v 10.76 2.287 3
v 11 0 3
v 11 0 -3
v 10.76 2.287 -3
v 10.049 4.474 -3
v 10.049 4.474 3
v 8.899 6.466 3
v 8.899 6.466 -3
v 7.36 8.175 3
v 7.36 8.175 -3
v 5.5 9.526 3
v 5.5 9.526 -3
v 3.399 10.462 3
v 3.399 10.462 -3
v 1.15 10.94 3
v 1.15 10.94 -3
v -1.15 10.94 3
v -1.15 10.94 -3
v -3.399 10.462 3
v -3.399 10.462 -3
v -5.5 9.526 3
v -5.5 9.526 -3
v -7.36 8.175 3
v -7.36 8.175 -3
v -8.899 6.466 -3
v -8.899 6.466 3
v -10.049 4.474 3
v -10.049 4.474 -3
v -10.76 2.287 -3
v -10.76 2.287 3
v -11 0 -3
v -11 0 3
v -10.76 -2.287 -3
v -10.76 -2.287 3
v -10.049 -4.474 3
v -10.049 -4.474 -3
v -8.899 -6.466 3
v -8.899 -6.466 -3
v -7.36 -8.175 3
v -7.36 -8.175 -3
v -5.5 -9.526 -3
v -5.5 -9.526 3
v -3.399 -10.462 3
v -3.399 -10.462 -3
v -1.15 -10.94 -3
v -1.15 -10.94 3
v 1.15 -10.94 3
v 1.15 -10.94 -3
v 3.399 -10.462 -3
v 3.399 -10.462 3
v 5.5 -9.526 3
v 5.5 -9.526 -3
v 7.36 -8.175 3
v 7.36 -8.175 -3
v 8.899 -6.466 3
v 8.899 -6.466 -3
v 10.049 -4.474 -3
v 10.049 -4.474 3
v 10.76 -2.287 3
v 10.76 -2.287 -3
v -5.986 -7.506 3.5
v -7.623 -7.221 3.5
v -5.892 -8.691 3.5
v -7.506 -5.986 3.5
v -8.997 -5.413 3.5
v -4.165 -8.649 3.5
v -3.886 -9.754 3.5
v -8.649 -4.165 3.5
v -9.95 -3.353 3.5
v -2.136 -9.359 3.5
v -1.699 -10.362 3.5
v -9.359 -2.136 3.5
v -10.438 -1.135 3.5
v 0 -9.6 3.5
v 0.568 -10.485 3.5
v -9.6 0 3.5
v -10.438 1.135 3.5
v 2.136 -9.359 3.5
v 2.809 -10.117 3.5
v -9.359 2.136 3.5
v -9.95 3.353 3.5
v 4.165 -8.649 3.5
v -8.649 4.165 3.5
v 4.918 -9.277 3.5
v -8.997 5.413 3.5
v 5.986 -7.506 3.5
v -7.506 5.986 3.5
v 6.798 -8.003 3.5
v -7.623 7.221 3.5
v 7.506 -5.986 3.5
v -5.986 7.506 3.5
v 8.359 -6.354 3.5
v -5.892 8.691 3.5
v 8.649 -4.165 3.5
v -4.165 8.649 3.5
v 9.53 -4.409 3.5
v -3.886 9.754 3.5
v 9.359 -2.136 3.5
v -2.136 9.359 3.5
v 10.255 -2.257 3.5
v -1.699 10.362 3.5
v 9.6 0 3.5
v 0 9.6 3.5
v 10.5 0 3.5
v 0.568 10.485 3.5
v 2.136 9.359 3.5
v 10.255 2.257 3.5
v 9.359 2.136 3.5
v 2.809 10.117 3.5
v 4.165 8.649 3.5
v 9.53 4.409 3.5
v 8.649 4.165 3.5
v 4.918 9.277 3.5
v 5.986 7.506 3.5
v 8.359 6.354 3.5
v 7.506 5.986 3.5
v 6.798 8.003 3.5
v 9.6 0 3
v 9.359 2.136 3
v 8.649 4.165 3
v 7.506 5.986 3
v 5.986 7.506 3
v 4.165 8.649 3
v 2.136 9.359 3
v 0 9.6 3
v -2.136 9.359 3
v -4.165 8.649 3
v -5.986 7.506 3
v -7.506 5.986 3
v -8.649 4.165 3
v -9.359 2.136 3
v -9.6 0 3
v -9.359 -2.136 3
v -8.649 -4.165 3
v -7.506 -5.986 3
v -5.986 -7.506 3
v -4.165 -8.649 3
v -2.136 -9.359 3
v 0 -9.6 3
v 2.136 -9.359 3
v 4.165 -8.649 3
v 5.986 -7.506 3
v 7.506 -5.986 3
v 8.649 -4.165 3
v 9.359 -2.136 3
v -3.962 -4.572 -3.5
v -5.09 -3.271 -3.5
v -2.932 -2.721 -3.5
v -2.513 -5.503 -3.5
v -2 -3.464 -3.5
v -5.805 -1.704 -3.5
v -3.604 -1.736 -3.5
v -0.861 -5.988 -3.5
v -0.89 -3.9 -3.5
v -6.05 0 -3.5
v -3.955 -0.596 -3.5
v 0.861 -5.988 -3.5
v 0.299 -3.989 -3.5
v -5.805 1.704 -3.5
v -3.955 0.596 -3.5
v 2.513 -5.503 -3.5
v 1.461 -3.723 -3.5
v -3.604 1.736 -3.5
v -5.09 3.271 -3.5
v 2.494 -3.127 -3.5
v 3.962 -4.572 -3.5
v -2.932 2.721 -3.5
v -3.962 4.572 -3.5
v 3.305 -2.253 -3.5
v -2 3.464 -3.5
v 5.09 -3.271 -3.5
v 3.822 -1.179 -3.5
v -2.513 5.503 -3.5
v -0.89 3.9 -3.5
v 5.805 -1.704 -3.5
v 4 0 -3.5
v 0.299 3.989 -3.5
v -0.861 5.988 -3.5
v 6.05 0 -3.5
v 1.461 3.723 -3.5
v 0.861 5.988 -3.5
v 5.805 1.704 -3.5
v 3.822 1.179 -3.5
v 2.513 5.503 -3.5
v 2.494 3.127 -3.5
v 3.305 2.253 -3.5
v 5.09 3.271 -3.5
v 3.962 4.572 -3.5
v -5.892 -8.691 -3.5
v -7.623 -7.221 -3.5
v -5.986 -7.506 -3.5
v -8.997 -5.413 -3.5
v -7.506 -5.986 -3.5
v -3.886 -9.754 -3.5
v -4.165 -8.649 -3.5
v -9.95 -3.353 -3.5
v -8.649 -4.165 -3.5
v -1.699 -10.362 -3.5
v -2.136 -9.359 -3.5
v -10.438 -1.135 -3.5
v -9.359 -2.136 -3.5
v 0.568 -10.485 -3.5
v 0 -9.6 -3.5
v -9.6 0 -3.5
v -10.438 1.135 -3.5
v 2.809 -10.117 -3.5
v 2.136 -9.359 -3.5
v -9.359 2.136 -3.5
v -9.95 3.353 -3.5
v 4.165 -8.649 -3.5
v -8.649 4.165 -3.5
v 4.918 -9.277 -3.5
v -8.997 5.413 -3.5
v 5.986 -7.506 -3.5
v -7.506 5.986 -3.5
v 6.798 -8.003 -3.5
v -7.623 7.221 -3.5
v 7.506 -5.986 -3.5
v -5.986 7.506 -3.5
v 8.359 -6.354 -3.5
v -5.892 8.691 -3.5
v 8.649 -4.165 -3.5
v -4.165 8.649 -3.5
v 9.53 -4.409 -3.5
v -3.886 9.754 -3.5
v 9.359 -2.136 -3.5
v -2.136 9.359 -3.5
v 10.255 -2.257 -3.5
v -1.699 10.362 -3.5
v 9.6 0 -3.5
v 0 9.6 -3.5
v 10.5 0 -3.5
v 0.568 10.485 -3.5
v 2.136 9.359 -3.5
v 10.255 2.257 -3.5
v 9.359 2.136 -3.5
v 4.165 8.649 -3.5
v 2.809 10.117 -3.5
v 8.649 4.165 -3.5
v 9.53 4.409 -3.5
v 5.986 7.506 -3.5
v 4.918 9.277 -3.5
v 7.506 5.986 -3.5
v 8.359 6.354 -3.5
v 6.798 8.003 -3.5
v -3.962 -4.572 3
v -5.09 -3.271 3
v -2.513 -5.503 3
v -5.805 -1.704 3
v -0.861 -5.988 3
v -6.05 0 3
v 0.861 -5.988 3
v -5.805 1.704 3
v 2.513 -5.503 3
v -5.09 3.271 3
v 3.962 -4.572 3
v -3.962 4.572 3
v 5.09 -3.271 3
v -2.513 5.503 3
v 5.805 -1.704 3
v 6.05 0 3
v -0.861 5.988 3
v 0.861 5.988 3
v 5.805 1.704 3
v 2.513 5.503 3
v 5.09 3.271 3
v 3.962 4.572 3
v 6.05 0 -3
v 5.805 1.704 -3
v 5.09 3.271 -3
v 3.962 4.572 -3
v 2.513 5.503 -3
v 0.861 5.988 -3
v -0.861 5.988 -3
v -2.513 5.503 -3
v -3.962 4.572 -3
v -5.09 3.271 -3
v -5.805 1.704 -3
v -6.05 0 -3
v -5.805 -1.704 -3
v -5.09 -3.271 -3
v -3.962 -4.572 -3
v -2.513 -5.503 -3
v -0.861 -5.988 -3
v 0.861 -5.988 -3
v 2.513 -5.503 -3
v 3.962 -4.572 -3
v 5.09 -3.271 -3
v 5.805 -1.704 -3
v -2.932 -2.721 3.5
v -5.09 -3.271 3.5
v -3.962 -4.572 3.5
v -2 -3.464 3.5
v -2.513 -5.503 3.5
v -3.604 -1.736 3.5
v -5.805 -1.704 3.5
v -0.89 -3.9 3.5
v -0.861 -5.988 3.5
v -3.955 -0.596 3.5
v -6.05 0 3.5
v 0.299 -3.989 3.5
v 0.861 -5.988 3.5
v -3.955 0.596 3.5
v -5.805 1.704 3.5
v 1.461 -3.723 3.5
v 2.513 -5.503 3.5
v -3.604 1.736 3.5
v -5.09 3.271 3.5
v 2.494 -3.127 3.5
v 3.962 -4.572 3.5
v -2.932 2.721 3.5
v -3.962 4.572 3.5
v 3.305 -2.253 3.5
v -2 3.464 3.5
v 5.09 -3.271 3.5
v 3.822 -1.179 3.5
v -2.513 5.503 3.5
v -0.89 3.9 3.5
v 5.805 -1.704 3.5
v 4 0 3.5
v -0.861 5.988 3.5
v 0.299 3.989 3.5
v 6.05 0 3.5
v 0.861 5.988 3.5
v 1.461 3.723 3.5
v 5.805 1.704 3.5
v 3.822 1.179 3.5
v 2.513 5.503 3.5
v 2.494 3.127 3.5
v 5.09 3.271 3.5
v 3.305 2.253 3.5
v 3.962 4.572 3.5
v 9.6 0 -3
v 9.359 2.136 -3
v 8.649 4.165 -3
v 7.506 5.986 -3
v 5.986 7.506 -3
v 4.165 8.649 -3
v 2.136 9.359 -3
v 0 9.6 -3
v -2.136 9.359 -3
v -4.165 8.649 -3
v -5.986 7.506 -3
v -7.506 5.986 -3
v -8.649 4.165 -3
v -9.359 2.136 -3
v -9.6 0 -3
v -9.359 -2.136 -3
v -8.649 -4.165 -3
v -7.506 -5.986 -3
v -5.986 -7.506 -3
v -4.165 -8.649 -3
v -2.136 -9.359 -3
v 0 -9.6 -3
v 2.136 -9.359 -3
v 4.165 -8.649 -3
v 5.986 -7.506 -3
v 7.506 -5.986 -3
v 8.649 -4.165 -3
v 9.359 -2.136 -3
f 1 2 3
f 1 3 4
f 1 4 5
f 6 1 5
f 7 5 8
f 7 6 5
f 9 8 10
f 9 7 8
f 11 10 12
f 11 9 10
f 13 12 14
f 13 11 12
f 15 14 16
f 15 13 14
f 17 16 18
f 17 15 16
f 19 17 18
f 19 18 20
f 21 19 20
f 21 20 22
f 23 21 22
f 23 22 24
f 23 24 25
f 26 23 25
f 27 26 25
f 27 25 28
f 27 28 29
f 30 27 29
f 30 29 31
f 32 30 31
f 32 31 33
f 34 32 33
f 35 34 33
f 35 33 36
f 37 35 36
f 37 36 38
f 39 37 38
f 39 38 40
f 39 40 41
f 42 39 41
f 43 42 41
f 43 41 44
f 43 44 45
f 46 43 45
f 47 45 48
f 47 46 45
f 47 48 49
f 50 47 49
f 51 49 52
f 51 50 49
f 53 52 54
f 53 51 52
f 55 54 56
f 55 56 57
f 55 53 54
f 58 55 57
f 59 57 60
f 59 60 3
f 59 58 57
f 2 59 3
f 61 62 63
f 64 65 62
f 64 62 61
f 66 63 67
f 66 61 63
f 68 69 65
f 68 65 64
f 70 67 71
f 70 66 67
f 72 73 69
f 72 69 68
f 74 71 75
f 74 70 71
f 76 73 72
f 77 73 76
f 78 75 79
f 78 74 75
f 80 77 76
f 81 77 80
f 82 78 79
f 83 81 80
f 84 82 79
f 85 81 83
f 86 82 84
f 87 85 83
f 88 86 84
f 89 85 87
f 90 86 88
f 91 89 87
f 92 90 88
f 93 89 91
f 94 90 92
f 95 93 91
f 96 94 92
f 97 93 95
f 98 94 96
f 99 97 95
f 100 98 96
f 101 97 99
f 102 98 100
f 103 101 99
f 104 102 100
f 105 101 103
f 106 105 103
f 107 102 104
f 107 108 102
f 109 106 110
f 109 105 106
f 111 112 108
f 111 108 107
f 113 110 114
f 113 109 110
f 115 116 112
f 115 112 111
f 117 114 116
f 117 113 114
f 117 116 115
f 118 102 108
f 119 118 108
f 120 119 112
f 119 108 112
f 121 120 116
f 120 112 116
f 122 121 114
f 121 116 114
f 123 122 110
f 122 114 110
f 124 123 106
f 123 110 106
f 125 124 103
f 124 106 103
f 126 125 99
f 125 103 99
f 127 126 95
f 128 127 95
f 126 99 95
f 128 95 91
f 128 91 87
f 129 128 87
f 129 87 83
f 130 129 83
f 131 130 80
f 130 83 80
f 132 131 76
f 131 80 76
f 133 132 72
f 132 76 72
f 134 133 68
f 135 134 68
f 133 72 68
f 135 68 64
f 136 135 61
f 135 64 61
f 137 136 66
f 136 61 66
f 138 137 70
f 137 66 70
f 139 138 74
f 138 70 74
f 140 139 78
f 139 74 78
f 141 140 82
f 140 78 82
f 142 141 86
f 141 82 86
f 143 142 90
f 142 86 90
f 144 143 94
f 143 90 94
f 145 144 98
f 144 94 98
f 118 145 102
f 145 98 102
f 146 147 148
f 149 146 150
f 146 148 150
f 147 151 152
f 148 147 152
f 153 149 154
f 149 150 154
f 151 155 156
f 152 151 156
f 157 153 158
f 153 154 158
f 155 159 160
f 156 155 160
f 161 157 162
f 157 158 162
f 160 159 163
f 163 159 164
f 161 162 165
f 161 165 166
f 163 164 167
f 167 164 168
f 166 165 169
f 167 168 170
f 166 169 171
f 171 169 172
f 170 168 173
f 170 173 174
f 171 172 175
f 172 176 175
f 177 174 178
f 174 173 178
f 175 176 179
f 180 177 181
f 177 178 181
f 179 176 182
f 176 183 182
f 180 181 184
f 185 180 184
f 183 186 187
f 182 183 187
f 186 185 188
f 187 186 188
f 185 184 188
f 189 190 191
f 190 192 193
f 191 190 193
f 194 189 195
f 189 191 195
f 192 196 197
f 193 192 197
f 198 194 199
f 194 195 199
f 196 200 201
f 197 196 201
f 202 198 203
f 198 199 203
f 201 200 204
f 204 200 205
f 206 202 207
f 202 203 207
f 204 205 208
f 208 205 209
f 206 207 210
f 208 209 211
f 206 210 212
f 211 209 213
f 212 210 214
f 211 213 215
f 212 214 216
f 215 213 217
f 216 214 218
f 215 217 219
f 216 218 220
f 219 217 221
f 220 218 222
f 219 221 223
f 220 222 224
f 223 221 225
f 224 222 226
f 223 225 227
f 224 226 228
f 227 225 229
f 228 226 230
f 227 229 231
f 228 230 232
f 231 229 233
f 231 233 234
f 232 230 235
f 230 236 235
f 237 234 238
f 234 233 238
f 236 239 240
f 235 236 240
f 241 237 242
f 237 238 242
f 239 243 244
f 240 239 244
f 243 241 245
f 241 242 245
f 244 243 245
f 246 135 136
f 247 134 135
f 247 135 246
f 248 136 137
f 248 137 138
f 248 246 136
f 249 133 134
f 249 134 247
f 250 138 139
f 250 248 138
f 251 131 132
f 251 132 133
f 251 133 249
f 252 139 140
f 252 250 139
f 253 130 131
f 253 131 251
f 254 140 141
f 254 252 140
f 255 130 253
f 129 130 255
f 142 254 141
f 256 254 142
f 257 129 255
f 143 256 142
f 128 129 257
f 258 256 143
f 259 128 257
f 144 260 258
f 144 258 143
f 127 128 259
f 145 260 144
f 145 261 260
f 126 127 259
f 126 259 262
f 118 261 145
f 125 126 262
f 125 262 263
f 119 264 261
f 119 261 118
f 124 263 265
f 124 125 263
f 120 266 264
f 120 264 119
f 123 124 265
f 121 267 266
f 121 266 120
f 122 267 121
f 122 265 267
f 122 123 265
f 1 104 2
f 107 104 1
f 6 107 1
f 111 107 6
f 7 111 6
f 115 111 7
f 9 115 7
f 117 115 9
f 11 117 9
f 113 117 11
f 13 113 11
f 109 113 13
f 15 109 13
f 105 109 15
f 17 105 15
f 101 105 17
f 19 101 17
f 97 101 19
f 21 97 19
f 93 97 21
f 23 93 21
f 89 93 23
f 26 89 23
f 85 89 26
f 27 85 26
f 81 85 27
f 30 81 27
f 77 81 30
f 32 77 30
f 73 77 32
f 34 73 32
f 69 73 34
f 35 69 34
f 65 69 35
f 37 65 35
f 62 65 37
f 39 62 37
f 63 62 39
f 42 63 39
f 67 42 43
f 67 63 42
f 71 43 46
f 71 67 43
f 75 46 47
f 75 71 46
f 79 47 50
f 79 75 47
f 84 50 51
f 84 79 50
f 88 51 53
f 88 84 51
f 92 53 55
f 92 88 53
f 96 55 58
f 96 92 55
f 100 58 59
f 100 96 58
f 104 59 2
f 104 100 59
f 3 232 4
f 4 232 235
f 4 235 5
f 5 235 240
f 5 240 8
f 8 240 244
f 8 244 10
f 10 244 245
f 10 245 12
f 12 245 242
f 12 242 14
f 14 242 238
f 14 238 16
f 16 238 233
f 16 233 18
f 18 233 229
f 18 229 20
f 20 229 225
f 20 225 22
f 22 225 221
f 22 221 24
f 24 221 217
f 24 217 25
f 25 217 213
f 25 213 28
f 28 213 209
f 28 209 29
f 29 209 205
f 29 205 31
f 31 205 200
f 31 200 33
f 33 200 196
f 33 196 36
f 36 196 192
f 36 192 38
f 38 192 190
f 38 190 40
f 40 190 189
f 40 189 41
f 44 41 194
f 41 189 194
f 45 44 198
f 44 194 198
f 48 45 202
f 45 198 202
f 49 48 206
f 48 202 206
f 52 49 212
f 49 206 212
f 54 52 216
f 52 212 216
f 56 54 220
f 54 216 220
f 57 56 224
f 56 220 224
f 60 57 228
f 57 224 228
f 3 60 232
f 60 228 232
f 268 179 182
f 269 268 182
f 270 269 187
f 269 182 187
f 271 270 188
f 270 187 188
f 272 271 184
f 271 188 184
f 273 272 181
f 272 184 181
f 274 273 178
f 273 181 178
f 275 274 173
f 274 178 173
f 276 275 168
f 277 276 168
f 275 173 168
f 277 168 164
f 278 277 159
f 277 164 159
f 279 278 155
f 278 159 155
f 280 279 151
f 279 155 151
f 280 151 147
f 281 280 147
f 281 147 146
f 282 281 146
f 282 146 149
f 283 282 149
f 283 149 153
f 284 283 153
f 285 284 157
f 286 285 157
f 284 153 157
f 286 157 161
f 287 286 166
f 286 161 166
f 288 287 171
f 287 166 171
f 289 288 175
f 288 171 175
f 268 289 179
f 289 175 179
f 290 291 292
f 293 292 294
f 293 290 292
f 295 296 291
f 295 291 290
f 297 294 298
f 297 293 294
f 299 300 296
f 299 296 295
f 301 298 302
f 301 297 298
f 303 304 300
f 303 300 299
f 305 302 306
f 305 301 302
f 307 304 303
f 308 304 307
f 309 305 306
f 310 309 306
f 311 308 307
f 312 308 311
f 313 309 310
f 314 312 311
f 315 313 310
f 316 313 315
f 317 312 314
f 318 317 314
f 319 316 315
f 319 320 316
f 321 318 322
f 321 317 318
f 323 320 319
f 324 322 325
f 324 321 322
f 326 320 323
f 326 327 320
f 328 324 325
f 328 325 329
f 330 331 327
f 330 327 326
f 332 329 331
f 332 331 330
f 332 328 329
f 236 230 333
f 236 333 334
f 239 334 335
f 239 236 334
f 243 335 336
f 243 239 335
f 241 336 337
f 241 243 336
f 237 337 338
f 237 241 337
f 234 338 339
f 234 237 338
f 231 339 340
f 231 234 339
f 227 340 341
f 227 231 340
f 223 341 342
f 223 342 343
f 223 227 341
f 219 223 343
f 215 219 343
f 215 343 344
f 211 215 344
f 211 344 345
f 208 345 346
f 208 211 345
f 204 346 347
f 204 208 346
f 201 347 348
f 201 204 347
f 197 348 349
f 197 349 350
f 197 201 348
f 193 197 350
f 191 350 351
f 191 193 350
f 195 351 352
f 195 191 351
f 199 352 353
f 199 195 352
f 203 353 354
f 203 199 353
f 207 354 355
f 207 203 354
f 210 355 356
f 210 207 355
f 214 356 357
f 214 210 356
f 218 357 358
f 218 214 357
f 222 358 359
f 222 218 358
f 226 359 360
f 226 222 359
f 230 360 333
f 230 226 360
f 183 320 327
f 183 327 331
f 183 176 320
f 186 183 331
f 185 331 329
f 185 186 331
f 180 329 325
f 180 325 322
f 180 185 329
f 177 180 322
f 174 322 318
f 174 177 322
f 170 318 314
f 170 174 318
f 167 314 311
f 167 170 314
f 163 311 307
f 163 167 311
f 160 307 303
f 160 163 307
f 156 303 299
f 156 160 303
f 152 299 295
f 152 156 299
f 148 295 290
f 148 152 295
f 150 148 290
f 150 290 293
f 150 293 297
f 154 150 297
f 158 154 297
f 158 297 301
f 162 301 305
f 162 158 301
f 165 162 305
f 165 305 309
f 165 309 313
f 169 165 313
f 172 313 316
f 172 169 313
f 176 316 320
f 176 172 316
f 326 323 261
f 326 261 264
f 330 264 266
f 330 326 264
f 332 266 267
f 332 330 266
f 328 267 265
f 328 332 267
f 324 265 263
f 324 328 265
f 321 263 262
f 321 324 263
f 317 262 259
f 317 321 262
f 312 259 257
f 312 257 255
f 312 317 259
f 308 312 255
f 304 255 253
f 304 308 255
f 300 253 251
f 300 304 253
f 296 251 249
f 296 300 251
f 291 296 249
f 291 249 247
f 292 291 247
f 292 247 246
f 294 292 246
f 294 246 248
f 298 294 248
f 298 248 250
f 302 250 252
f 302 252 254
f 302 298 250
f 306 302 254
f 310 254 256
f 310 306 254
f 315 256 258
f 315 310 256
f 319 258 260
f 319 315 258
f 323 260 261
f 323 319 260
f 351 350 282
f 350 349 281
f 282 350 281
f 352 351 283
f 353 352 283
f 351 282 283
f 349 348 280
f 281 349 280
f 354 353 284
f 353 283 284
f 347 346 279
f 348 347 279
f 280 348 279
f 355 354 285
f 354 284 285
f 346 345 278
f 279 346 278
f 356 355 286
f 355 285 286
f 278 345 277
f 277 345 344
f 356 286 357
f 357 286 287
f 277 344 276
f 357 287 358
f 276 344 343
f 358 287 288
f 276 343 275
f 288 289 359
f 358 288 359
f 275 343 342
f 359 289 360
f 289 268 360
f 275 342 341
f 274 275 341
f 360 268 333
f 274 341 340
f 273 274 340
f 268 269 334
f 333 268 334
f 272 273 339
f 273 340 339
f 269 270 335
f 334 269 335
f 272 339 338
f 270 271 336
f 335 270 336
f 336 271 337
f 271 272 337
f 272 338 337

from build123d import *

# Parameters (mm, degrees)
SKETCH_1_R          = 11
SKETCH_1_R_2        = 4
EXTRUDE_1_DEPTH     = 3.5
CHAMFER_1_SIZE      = 0.5
SKETCH_2_R          = 9.6
SKETCH_2_R_2        = 6.05
CUT_EXTRUDE_1_DEPTH = 0.5


with BuildPart() as part:
    # 스케치1 → 보스-돌출1 (new, symmetric)
    with BuildSketch(Plane.XY):
        Circle(SKETCH_1_R)
        Circle(SKETCH_1_R_2, mode=Mode.SUBTRACT)
    extrude(amount=EXTRUDE_1_DEPTH, both=True)

    # 모따기1
    chamfer_1_edges = [part.edges().sort_by_distance(p)[0] for p in [
        (-11, 0, -3.5),
        (-11, 0, 3.5),
    ]]
    chamfer(chamfer_1_edges, length=CHAMFER_1_SIZE)

    # 스케치2 → 컷-돌출1 (cut)
    with BuildSketch(Plane.XY.offset(3.5)):
        Circle(SKETCH_2_R)
        Circle(SKETCH_2_R_2, mode=Mode.SUBTRACT)
    cut_extrude_1 = extrude(amount=-CUT_EXTRUDE_1_DEPTH, mode=Mode.SUBTRACT)

    # 대칭 복사1: 컷-돌출1 across plane
    add(cut_extrude_1.mirror(Plane.XY), mode=Mode.SUBTRACT)


solid = part.part
